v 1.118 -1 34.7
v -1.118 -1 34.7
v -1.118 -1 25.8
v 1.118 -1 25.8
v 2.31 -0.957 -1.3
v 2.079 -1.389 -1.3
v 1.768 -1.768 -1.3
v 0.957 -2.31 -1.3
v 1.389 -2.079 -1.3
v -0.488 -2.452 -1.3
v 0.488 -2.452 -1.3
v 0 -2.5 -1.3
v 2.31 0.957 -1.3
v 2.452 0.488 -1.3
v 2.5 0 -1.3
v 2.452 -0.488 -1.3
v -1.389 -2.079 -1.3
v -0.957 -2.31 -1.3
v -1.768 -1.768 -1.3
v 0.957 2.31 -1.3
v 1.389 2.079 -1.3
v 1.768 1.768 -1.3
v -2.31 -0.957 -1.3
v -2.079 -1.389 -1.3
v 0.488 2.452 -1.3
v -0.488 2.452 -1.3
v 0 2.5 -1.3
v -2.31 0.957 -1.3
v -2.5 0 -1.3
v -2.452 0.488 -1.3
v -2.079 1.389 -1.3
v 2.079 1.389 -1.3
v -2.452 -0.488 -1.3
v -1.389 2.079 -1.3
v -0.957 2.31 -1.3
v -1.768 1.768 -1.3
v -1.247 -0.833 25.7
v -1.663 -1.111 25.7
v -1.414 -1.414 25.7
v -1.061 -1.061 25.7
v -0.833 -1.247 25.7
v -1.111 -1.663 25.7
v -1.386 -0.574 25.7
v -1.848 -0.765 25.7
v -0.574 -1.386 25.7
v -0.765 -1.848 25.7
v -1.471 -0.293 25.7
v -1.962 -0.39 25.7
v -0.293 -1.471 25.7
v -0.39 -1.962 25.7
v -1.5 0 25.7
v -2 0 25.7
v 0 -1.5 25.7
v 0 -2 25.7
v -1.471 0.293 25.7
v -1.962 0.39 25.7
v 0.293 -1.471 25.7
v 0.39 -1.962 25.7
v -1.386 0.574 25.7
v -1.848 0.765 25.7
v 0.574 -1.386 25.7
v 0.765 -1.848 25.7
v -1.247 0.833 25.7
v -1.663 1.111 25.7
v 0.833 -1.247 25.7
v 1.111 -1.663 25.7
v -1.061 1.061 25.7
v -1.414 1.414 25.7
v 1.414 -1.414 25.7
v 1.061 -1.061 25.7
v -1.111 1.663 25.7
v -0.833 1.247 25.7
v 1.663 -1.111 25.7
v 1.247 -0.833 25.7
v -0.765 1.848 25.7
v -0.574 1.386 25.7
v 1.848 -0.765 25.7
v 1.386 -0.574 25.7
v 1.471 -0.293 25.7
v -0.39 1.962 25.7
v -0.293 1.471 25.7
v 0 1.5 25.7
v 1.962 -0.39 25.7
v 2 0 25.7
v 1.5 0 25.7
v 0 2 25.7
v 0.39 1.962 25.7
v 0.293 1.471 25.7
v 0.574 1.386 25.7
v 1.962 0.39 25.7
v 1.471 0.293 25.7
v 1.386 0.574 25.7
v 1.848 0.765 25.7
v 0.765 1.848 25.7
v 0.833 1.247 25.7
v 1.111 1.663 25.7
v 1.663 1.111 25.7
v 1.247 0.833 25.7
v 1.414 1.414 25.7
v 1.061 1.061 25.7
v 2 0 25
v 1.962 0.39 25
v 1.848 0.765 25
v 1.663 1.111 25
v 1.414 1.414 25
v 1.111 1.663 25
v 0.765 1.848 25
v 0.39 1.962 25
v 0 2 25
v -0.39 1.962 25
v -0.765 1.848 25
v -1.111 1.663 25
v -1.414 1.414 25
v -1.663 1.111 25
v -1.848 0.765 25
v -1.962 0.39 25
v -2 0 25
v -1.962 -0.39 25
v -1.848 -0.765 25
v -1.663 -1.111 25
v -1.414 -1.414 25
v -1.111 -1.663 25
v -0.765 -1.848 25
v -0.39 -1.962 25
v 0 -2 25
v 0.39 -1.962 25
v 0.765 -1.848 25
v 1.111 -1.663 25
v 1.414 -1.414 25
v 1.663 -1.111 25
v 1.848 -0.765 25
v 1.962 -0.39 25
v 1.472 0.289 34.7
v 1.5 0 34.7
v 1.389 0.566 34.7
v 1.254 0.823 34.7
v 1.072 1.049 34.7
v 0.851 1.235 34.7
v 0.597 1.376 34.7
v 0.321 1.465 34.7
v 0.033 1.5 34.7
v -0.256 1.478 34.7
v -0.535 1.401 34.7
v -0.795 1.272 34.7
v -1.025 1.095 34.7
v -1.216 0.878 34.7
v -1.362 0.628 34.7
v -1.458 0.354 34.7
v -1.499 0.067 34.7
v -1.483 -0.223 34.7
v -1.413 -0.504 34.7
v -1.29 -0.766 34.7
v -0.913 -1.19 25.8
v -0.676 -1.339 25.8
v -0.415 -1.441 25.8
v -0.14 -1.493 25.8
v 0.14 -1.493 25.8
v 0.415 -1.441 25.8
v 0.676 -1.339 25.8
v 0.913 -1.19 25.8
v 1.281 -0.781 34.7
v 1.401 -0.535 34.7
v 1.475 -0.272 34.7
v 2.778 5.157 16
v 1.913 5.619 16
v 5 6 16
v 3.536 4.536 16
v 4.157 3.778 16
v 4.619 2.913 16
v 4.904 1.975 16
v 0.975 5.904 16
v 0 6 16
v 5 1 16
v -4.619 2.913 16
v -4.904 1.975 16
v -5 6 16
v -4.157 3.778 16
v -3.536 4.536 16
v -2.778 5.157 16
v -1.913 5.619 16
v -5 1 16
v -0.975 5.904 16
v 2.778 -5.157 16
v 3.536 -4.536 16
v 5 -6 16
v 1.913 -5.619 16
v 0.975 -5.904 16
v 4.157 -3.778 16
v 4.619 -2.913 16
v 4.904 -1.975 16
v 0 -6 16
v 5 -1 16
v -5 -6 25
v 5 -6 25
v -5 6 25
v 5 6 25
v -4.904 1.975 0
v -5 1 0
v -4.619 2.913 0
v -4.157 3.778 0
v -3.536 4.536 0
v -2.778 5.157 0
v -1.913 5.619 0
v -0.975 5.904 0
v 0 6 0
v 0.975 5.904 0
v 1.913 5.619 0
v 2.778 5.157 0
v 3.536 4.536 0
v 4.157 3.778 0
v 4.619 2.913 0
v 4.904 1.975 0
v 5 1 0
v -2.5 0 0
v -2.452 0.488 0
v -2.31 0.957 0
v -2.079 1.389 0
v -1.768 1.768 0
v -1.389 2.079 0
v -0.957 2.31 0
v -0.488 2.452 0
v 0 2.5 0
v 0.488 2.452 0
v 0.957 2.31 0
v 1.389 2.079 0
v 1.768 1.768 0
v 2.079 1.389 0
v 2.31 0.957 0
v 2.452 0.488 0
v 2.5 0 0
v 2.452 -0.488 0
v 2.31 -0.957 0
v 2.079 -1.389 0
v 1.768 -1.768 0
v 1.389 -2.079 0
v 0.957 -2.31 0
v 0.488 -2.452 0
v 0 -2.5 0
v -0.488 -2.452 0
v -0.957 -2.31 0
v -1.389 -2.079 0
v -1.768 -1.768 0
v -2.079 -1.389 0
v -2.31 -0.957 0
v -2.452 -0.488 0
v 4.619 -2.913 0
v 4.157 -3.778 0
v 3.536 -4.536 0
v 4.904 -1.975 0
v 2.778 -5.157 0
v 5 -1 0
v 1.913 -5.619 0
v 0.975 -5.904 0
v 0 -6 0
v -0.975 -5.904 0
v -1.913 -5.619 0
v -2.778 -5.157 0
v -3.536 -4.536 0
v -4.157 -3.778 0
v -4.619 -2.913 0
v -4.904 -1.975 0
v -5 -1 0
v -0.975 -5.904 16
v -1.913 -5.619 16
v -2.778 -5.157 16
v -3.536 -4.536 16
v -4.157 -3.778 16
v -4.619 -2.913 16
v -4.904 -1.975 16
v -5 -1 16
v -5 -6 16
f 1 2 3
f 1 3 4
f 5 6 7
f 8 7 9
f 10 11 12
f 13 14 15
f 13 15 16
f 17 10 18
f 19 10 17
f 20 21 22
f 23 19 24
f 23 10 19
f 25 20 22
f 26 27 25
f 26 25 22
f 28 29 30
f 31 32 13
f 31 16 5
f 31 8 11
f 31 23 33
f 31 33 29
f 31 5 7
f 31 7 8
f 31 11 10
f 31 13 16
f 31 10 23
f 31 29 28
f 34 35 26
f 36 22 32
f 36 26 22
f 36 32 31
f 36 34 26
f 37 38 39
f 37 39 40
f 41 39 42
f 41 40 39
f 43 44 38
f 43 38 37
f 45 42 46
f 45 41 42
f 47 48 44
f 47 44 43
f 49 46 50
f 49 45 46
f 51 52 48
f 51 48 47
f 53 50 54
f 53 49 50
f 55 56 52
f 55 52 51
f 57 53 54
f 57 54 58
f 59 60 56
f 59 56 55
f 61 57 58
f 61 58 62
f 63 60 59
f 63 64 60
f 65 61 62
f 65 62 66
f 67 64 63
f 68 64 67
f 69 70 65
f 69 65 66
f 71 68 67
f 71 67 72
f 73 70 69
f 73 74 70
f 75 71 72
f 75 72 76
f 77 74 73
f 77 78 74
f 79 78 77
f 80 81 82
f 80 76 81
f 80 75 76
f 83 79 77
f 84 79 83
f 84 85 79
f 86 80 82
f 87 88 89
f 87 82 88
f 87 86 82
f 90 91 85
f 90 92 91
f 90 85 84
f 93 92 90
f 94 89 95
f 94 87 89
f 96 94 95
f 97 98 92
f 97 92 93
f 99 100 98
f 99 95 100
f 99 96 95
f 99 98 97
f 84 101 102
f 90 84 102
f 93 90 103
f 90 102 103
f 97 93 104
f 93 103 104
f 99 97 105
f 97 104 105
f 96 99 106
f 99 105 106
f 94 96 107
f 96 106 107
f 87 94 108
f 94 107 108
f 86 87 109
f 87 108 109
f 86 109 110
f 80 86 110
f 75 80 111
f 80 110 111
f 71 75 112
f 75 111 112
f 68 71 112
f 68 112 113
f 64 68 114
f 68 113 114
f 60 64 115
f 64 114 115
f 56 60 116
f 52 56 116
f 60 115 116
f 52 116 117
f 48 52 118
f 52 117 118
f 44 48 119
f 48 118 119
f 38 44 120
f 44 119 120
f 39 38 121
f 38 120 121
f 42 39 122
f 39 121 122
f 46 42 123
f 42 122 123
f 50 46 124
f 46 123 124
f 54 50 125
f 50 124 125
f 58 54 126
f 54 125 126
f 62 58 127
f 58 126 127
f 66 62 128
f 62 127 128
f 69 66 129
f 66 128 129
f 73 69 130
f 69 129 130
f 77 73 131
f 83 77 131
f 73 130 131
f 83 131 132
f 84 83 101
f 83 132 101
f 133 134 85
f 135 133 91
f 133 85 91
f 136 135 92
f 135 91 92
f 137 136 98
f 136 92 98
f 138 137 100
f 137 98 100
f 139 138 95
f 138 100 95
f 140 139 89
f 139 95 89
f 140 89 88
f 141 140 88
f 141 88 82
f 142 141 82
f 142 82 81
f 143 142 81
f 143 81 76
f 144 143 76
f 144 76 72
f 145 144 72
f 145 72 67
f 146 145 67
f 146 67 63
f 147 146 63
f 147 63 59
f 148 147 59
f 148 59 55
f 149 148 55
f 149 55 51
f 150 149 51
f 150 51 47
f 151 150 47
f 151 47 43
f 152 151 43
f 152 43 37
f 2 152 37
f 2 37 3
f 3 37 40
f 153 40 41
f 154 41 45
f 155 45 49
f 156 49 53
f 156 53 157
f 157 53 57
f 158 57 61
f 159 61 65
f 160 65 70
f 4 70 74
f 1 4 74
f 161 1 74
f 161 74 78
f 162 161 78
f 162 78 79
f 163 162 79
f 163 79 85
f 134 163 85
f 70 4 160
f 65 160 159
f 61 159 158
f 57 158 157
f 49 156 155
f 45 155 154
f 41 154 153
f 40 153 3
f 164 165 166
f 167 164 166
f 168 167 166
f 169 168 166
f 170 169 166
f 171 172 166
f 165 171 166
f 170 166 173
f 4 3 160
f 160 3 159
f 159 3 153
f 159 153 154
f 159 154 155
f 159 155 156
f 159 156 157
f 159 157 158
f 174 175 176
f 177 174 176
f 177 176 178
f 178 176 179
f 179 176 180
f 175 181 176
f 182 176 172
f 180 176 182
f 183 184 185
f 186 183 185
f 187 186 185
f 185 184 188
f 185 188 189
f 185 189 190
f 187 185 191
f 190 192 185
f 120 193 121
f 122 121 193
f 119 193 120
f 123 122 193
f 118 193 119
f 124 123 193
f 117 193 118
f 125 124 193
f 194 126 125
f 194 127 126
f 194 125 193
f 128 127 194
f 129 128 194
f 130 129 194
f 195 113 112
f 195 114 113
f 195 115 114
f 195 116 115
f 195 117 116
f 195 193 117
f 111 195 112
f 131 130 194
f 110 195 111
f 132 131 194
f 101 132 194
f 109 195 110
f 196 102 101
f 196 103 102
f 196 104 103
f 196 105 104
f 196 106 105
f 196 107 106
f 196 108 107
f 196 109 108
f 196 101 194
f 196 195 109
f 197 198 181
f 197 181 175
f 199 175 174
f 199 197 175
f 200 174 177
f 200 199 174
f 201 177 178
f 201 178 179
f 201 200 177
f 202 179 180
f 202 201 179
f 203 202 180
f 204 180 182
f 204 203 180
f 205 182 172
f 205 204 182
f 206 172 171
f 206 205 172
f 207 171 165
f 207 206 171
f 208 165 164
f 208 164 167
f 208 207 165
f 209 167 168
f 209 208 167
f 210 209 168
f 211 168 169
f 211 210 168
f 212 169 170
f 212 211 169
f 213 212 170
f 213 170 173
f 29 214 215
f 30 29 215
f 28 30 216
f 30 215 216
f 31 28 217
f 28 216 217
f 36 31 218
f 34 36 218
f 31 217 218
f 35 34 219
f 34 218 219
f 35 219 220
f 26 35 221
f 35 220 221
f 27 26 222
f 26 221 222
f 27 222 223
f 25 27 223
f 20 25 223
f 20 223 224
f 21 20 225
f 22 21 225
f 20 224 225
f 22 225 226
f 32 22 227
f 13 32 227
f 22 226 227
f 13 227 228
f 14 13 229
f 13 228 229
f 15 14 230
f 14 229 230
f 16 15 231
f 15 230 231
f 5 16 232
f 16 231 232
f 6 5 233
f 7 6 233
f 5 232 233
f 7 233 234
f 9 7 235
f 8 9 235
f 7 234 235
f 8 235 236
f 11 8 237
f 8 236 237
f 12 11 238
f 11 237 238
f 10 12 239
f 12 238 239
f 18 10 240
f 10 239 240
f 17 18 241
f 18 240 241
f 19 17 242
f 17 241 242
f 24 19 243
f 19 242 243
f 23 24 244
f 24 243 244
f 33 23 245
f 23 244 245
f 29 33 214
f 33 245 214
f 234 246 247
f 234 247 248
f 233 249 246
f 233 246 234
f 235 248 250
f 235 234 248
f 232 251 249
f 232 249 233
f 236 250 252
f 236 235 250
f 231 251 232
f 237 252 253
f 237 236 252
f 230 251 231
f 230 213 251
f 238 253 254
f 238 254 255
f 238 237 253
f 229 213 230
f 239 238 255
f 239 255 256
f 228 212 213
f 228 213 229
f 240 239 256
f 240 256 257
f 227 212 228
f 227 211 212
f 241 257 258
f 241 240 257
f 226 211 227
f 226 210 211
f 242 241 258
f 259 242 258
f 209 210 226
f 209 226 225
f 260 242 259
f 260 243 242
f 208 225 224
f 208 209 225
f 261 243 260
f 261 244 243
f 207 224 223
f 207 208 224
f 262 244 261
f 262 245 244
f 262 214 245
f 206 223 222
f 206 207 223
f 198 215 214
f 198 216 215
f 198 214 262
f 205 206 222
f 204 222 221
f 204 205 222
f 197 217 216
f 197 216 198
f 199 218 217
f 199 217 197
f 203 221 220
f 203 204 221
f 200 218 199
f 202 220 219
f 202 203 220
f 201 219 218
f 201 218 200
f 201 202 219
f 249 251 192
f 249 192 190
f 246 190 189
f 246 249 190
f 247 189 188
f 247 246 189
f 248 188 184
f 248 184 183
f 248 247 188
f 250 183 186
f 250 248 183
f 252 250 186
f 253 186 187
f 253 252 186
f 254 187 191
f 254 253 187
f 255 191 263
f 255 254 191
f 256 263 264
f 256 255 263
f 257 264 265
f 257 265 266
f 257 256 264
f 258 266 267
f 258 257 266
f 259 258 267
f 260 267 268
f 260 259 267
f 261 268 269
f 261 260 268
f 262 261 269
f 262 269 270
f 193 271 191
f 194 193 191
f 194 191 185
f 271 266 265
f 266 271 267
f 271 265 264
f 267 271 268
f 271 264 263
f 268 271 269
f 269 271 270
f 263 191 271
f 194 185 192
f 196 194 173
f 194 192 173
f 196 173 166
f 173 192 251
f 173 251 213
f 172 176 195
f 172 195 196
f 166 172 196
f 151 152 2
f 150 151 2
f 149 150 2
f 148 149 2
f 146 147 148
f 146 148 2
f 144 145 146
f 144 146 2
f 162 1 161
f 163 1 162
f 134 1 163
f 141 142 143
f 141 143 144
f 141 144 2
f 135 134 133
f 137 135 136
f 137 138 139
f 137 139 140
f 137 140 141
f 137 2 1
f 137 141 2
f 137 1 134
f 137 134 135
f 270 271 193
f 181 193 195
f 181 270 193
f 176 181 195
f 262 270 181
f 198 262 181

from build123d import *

# Parameters (mm, degrees)
BOSS_EXTRUDE1_DEPTH = 16
SKETCH2_R           = 2.5
BOSS_EXTRUDE2_DEPTH = 1.3
SKETCH3_W           = 10
SKETCH3_H           = 12
BOSS_EXTRUDE3_DEPTH = 9
SKETCH4_R           = 2
BOSS_EXTRUDE4_DEPTH = 0.7
SKETCH5_R           = 1.5
BOSS_EXTRUDE5_DEPTH = 9
SKETCH6_W           = 5.348549536
SKETCH6_H           = 1.415696151
CUT_EXTRUDE1_DEPTH  = 8.9


with BuildPart() as part:
    # Sketch1 → Boss-Extrude1 (new body)
    with BuildSketch(Plane.XY):
        with BuildLine():
            Line((-5, -1), (-5, 1))
            ThreePointArc((-5, 1), (0, 6), (5, 1))
            Line((5, 1), (5, -1))
            ThreePointArc((5, -1), (0, -6), (-5, -1))
        make_face()
    extrude(amount=BOSS_EXTRUDE1_DEPTH)

    # Sketch2 → Boss-Extrude2 (add)
    with BuildSketch(Plane(origin=(0, 0, 0), x_dir=(-1, 0, 0), z_dir=(0, 0, -1))):
        Circle(SKETCH2_R)
    extrude(amount=BOSS_EXTRUDE2_DEPTH)

    # Sketch3 → Boss-Extrude3 (add)
    with BuildSketch(Plane.XY.offset(16)):
        Rectangle(SKETCH3_W, SKETCH3_H)
    extrude(amount=BOSS_EXTRUDE3_DEPTH)

    # Sketch4 → Boss-Extrude4 (add)
    with BuildSketch(Plane.XY.offset(25)):
        Circle(SKETCH4_R)
    extrude(amount=BOSS_EXTRUDE4_DEPTH)

    # Sketch5 → Boss-Extrude5 (add)
    with BuildSketch(Plane.XY.offset(25.7)):
        Circle(SKETCH5_R)
    extrude(amount=BOSS_EXTRUDE5_DEPTH)

    # Sketch6 → Cut-Extrude1 (cut)
    with BuildSketch(Plane.XY.offset(34.7)):
        with Locations((0, -1.707848076)):
            Rectangle(SKETCH6_W, SKETCH6_H)
    extrude(amount=-CUT_EXTRUDE1_DEPTH, mode=Mode.SUBTRACT)


solid = part.part
